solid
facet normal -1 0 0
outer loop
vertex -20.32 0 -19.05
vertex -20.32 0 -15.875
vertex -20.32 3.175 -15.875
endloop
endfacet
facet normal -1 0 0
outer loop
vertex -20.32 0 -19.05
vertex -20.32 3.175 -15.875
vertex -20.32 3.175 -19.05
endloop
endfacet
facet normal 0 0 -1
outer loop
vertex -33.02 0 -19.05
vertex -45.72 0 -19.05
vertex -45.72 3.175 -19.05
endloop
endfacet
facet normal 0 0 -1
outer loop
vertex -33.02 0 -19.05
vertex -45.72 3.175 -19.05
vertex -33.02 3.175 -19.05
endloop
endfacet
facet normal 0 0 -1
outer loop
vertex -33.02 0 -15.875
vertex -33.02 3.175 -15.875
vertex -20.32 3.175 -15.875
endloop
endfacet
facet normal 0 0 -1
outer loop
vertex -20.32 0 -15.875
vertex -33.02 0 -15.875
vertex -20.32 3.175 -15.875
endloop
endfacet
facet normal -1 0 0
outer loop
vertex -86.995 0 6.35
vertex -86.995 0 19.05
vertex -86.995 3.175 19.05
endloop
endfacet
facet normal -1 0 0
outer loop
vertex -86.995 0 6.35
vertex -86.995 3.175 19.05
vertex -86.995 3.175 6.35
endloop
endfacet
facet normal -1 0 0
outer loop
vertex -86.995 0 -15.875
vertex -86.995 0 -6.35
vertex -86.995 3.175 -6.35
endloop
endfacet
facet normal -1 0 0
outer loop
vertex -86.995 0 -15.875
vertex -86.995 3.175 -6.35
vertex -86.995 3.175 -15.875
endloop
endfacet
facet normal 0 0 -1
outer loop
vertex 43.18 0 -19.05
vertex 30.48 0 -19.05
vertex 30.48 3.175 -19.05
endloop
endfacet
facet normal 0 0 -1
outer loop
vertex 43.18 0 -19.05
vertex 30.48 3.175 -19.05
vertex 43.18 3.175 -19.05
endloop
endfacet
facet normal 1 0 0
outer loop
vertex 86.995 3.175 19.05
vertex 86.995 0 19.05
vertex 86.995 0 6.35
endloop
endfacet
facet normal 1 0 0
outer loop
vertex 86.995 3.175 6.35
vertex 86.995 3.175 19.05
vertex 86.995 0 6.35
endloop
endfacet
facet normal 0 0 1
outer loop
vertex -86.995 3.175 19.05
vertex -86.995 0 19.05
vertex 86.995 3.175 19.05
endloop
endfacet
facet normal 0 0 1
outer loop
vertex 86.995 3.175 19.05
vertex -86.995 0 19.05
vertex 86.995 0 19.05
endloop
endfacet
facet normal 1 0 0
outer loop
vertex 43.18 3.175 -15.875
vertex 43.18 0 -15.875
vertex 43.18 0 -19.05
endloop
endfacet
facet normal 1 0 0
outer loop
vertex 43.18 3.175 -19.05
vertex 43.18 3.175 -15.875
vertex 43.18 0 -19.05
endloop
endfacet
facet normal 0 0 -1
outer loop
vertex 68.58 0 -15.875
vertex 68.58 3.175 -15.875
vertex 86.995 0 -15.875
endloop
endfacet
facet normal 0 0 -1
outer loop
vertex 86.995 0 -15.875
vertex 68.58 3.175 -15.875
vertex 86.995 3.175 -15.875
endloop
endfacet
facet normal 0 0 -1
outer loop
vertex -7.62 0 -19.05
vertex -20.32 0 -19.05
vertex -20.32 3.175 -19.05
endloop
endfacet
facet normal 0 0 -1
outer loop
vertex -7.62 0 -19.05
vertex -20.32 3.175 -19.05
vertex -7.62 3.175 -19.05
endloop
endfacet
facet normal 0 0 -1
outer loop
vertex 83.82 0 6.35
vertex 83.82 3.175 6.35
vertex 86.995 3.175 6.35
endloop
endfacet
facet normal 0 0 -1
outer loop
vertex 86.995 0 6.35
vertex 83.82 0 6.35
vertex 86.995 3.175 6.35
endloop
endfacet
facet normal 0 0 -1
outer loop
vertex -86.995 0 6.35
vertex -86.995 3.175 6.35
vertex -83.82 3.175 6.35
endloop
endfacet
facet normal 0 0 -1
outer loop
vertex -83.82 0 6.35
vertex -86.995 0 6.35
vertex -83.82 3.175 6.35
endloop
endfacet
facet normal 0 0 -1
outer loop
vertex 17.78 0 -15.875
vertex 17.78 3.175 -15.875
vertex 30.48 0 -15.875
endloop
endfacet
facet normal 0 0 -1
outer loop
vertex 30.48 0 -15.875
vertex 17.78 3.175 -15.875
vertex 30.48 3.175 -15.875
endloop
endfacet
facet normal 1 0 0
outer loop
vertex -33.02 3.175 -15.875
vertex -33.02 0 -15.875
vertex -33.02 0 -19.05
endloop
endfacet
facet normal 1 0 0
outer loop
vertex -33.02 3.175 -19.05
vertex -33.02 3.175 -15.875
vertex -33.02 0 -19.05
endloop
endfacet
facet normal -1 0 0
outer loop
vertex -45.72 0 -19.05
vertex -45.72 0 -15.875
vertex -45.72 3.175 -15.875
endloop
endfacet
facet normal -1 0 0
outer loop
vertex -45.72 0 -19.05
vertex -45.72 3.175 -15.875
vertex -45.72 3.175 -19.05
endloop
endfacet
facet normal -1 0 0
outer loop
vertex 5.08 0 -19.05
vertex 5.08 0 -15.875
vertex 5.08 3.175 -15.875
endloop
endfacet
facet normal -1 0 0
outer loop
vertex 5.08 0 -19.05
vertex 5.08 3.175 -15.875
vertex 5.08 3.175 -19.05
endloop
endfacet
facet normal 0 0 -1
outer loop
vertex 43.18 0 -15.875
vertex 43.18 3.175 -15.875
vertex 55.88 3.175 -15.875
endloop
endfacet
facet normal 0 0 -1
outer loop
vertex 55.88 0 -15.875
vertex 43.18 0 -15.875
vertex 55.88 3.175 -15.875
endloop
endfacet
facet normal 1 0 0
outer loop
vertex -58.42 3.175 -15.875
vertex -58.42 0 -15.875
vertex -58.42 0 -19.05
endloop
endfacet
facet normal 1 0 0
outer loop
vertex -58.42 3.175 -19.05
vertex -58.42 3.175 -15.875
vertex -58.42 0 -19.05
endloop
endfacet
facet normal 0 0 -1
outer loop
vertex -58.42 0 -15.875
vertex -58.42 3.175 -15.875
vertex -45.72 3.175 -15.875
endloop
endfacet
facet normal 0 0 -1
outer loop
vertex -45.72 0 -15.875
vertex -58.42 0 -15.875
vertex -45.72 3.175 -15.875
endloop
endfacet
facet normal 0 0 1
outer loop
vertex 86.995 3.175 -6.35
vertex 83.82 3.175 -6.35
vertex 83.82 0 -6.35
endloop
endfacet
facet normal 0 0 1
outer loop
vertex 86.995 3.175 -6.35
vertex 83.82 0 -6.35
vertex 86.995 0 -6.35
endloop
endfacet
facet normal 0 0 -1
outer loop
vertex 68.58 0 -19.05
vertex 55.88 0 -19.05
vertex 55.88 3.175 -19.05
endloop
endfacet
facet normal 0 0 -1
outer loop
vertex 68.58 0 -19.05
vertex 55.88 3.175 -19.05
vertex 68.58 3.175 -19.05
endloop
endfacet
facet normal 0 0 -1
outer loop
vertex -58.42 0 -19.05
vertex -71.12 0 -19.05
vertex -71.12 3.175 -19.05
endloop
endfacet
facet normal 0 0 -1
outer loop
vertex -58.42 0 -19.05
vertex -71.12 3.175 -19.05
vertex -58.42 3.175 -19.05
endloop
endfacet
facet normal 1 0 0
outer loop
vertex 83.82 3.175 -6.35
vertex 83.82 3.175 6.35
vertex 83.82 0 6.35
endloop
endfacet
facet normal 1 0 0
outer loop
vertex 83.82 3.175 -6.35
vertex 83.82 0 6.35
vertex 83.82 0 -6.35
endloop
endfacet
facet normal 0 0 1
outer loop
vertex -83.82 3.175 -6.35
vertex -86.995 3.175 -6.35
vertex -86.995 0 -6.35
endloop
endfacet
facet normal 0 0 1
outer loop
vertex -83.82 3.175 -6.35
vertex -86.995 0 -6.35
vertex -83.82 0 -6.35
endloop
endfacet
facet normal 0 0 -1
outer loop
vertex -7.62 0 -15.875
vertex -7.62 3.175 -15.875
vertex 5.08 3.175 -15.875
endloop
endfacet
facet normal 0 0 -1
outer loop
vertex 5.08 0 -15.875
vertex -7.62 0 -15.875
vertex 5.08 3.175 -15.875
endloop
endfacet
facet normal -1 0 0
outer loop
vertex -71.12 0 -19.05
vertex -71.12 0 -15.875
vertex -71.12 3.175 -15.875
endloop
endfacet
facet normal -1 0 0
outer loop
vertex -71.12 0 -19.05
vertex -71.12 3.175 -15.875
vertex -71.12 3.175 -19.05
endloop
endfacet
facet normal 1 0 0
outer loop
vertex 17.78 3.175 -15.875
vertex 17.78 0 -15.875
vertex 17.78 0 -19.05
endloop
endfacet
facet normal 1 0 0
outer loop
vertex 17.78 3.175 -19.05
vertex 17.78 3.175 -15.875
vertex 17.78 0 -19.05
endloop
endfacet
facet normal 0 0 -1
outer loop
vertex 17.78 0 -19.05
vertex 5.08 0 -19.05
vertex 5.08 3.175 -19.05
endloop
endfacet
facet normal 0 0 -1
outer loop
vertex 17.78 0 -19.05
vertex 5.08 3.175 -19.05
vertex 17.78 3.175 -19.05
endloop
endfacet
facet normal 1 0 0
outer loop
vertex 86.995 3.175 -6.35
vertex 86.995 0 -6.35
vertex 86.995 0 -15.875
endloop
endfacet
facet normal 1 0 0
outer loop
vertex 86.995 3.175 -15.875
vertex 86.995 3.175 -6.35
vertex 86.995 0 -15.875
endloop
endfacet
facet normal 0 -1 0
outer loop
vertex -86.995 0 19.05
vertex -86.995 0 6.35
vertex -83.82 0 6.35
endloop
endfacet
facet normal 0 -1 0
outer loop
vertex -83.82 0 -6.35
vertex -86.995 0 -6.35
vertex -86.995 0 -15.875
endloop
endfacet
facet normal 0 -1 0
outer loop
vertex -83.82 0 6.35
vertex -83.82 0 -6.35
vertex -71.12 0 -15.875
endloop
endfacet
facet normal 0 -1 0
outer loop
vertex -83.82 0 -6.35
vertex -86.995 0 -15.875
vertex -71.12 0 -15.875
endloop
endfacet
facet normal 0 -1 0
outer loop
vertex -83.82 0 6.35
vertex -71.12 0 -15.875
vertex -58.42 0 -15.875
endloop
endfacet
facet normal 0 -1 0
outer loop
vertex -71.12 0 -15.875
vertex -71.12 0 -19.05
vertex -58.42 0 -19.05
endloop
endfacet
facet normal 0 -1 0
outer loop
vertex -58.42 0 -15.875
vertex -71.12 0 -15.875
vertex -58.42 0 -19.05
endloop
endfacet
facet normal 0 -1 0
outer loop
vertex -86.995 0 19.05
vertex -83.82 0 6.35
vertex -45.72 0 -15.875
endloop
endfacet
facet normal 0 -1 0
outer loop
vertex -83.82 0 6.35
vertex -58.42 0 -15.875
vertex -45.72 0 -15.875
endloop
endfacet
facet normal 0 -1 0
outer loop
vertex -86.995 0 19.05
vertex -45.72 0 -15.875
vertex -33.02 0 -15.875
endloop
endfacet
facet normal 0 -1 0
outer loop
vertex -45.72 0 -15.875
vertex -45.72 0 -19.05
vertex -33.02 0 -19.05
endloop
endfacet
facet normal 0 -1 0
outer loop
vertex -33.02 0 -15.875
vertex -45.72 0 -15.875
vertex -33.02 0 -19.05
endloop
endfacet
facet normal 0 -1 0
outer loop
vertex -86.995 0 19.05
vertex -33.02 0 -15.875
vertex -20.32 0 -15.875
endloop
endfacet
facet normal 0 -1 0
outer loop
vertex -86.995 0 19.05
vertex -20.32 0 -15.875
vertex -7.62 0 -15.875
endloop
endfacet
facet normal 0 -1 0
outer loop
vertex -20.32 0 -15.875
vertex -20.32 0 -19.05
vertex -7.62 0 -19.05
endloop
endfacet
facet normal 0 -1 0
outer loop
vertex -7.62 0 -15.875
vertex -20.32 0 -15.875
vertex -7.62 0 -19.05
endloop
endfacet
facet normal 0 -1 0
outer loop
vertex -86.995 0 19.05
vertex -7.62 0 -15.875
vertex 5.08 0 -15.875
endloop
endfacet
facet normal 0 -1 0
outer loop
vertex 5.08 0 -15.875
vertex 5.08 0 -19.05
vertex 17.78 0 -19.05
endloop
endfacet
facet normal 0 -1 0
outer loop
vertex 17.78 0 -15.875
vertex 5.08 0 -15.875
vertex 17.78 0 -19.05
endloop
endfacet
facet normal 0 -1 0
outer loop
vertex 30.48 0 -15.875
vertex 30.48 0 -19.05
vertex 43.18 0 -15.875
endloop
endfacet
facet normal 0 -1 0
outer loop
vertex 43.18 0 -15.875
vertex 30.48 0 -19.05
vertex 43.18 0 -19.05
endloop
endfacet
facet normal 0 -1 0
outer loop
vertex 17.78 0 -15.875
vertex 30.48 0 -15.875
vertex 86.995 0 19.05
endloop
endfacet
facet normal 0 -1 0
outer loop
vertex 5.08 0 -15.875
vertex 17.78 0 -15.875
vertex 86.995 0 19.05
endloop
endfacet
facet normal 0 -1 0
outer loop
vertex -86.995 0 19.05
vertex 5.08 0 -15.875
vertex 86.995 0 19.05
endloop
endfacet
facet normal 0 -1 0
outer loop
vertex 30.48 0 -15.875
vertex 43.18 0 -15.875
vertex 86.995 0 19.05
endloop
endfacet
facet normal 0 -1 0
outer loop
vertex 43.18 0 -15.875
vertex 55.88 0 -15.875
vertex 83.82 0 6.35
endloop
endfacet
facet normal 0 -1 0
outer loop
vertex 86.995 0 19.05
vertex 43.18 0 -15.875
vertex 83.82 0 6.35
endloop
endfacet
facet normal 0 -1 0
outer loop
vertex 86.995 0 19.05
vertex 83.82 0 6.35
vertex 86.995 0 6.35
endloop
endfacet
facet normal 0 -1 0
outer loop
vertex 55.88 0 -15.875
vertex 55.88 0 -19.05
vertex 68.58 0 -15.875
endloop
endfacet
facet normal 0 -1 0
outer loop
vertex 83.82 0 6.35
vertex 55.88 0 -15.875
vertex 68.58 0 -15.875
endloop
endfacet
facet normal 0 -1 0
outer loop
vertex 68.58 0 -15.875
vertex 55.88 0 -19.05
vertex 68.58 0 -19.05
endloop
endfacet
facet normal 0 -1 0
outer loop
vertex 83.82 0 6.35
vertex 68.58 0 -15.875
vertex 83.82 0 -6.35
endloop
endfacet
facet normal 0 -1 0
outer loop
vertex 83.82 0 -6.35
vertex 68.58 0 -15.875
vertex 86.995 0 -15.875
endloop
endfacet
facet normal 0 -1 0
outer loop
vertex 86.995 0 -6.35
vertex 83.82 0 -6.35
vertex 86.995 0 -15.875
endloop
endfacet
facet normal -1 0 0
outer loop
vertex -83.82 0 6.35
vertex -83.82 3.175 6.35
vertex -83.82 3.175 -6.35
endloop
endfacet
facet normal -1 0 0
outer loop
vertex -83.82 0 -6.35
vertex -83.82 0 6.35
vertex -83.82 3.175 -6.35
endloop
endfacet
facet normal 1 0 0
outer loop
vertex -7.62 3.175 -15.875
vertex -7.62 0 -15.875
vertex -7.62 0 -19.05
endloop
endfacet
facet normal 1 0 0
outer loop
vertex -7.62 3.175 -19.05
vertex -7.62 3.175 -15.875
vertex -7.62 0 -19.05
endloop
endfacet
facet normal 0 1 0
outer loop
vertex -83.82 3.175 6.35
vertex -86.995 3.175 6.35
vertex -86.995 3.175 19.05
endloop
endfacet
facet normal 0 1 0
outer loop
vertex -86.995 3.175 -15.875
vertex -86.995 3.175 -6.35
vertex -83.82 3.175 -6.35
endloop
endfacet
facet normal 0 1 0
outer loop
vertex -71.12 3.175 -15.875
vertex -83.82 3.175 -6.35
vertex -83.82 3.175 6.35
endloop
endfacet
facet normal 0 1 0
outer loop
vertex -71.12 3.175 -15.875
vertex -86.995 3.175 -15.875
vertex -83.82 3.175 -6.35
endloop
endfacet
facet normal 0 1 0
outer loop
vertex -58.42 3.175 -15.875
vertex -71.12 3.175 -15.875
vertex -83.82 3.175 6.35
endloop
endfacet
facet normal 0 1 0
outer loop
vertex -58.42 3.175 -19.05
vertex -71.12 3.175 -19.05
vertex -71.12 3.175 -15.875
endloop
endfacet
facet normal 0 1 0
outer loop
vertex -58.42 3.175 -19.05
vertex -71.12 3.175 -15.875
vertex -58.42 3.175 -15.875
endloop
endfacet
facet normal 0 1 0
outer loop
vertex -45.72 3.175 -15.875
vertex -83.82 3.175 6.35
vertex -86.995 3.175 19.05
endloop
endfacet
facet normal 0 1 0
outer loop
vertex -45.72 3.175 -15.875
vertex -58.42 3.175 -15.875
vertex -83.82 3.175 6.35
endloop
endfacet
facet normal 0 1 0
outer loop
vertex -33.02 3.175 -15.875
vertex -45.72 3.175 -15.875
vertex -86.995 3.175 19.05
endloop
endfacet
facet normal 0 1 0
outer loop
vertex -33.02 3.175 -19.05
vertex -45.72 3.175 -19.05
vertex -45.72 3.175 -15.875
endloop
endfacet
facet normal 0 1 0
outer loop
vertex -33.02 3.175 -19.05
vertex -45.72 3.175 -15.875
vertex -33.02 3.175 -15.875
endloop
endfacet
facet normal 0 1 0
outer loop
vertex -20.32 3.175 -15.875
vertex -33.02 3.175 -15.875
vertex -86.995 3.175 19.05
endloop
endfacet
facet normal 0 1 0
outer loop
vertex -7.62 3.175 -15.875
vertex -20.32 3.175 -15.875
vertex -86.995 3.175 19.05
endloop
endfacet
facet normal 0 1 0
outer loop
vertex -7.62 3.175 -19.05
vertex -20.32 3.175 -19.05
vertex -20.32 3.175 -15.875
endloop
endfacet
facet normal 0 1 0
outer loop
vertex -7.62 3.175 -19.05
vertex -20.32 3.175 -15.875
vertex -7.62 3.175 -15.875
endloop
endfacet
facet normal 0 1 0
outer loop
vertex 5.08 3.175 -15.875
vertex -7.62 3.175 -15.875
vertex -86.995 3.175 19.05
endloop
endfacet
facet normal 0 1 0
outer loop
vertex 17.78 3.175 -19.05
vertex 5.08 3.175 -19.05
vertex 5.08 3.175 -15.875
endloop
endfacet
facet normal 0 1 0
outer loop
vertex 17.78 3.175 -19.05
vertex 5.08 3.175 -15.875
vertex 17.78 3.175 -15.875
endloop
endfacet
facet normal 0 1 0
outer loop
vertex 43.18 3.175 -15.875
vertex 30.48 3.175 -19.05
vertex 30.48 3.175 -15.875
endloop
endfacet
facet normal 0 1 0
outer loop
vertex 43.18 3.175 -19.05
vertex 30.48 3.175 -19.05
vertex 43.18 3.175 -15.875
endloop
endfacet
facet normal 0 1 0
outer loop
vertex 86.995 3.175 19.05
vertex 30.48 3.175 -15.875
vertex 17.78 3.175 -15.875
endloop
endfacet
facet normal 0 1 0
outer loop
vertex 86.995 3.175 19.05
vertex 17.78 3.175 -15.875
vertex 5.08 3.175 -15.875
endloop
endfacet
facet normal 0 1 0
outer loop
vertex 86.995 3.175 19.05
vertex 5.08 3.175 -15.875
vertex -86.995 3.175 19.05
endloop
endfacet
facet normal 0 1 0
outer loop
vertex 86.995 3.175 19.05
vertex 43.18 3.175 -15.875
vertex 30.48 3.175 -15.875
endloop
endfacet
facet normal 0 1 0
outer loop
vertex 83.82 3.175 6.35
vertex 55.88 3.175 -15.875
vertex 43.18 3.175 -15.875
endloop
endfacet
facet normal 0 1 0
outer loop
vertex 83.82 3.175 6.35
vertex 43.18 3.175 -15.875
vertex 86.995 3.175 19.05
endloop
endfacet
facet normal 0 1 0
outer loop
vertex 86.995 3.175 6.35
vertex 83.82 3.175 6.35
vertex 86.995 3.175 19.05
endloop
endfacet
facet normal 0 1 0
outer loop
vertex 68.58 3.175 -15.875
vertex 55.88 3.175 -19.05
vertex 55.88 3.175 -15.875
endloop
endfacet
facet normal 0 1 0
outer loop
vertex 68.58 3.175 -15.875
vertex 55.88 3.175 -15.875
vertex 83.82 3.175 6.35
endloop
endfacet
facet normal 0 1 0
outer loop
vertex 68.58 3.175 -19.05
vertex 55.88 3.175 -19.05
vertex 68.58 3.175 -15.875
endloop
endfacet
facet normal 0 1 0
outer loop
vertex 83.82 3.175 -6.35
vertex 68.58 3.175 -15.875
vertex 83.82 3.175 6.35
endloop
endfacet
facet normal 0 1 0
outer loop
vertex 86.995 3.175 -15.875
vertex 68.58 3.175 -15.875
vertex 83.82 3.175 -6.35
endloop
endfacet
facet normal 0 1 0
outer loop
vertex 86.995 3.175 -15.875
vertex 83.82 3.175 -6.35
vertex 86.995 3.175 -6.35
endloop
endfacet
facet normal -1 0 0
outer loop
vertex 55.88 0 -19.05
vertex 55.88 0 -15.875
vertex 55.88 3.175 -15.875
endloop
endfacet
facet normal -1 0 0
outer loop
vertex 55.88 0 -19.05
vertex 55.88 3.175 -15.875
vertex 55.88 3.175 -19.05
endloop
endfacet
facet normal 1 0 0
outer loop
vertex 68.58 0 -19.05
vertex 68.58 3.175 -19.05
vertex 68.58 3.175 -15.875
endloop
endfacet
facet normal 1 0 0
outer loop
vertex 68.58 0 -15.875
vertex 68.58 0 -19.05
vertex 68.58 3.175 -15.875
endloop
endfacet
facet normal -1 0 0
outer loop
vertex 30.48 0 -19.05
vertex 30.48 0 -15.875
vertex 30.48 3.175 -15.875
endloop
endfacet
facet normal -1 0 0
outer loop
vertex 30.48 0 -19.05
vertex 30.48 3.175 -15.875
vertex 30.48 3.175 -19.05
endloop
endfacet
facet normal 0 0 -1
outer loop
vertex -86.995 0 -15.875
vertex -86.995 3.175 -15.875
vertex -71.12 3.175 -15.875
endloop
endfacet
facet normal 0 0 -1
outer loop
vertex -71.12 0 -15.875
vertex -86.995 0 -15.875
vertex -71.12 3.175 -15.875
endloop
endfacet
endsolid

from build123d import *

# Parameters (mm, degrees)
SKETCH1_W           = 173.99
SKETCH1_H           = 38.1
BOSS_EXTRUDE1_DEPTH = 3.175
SKETCH2_W           = 15.875
SKETCH2_H           = 3.175
SKETCH2_W_2         = 12.7
SKETCH2_W_3         = 3.175
SKETCH2_H_2         = 12.7
CUT_EXTRUDE1_DEPTH  = 3.175


with BuildPart() as part:
    # Sketch1 → Boss-Extrude1 (new body)
    with BuildSketch(Plane(origin=(0, 0, 0), x_dir=(1, 0, 0), z_dir=(0, 1, 0))):
        Rectangle(SKETCH1_W, SKETCH1_H)
    extrude(amount=BOSS_EXTRUDE1_DEPTH)

    # Sketch2 → Cut-Extrude1 (cut)
    with BuildSketch(Plane(origin=(0, 3.175, 0), x_dir=(1, 0, 0), z_dir=(0, 1, 0))):
        with Locations((-79.0575, 17.4625)):
            Rectangle(SKETCH2_W, SKETCH2_H)
        with Locations((-52.07, 17.4625)):
            Rectangle(SKETCH2_W_2, SKETCH2_H)
        with Locations((-26.67, 17.4625)):
            Rectangle(SKETCH2_W_2, SKETCH2_H)
        with Locations((-1.27, 17.4625)):
            Rectangle(SKETCH2_W_2, SKETCH2_H)
        with Locations((24.13, 17.4625)):
            Rectangle(SKETCH2_W_2, SKETCH2_H)
        with Locations((49.53, 17.4625)):
            Rectangle(SKETCH2_W_2, SKETCH2_H)
        Polygon((68.58, 19.05), (68.58, 15.875), (81.28, 15.875), (86.995, 15.875), (86.995, 19.05), (81.28, 19.05), align=None)
        with Locations((-85.4075, 0)):
            Rectangle(SKETCH2_W_3, SKETCH2_H_2)
        with Locations((85.4075, 0)):
            Rectangle(SKETCH2_W_3, SKETCH2_H_2)
    extrude(amount=-CUT_EXTRUDE1_DEPTH, mode=Mode.SUBTRACT)


solid = part.part
